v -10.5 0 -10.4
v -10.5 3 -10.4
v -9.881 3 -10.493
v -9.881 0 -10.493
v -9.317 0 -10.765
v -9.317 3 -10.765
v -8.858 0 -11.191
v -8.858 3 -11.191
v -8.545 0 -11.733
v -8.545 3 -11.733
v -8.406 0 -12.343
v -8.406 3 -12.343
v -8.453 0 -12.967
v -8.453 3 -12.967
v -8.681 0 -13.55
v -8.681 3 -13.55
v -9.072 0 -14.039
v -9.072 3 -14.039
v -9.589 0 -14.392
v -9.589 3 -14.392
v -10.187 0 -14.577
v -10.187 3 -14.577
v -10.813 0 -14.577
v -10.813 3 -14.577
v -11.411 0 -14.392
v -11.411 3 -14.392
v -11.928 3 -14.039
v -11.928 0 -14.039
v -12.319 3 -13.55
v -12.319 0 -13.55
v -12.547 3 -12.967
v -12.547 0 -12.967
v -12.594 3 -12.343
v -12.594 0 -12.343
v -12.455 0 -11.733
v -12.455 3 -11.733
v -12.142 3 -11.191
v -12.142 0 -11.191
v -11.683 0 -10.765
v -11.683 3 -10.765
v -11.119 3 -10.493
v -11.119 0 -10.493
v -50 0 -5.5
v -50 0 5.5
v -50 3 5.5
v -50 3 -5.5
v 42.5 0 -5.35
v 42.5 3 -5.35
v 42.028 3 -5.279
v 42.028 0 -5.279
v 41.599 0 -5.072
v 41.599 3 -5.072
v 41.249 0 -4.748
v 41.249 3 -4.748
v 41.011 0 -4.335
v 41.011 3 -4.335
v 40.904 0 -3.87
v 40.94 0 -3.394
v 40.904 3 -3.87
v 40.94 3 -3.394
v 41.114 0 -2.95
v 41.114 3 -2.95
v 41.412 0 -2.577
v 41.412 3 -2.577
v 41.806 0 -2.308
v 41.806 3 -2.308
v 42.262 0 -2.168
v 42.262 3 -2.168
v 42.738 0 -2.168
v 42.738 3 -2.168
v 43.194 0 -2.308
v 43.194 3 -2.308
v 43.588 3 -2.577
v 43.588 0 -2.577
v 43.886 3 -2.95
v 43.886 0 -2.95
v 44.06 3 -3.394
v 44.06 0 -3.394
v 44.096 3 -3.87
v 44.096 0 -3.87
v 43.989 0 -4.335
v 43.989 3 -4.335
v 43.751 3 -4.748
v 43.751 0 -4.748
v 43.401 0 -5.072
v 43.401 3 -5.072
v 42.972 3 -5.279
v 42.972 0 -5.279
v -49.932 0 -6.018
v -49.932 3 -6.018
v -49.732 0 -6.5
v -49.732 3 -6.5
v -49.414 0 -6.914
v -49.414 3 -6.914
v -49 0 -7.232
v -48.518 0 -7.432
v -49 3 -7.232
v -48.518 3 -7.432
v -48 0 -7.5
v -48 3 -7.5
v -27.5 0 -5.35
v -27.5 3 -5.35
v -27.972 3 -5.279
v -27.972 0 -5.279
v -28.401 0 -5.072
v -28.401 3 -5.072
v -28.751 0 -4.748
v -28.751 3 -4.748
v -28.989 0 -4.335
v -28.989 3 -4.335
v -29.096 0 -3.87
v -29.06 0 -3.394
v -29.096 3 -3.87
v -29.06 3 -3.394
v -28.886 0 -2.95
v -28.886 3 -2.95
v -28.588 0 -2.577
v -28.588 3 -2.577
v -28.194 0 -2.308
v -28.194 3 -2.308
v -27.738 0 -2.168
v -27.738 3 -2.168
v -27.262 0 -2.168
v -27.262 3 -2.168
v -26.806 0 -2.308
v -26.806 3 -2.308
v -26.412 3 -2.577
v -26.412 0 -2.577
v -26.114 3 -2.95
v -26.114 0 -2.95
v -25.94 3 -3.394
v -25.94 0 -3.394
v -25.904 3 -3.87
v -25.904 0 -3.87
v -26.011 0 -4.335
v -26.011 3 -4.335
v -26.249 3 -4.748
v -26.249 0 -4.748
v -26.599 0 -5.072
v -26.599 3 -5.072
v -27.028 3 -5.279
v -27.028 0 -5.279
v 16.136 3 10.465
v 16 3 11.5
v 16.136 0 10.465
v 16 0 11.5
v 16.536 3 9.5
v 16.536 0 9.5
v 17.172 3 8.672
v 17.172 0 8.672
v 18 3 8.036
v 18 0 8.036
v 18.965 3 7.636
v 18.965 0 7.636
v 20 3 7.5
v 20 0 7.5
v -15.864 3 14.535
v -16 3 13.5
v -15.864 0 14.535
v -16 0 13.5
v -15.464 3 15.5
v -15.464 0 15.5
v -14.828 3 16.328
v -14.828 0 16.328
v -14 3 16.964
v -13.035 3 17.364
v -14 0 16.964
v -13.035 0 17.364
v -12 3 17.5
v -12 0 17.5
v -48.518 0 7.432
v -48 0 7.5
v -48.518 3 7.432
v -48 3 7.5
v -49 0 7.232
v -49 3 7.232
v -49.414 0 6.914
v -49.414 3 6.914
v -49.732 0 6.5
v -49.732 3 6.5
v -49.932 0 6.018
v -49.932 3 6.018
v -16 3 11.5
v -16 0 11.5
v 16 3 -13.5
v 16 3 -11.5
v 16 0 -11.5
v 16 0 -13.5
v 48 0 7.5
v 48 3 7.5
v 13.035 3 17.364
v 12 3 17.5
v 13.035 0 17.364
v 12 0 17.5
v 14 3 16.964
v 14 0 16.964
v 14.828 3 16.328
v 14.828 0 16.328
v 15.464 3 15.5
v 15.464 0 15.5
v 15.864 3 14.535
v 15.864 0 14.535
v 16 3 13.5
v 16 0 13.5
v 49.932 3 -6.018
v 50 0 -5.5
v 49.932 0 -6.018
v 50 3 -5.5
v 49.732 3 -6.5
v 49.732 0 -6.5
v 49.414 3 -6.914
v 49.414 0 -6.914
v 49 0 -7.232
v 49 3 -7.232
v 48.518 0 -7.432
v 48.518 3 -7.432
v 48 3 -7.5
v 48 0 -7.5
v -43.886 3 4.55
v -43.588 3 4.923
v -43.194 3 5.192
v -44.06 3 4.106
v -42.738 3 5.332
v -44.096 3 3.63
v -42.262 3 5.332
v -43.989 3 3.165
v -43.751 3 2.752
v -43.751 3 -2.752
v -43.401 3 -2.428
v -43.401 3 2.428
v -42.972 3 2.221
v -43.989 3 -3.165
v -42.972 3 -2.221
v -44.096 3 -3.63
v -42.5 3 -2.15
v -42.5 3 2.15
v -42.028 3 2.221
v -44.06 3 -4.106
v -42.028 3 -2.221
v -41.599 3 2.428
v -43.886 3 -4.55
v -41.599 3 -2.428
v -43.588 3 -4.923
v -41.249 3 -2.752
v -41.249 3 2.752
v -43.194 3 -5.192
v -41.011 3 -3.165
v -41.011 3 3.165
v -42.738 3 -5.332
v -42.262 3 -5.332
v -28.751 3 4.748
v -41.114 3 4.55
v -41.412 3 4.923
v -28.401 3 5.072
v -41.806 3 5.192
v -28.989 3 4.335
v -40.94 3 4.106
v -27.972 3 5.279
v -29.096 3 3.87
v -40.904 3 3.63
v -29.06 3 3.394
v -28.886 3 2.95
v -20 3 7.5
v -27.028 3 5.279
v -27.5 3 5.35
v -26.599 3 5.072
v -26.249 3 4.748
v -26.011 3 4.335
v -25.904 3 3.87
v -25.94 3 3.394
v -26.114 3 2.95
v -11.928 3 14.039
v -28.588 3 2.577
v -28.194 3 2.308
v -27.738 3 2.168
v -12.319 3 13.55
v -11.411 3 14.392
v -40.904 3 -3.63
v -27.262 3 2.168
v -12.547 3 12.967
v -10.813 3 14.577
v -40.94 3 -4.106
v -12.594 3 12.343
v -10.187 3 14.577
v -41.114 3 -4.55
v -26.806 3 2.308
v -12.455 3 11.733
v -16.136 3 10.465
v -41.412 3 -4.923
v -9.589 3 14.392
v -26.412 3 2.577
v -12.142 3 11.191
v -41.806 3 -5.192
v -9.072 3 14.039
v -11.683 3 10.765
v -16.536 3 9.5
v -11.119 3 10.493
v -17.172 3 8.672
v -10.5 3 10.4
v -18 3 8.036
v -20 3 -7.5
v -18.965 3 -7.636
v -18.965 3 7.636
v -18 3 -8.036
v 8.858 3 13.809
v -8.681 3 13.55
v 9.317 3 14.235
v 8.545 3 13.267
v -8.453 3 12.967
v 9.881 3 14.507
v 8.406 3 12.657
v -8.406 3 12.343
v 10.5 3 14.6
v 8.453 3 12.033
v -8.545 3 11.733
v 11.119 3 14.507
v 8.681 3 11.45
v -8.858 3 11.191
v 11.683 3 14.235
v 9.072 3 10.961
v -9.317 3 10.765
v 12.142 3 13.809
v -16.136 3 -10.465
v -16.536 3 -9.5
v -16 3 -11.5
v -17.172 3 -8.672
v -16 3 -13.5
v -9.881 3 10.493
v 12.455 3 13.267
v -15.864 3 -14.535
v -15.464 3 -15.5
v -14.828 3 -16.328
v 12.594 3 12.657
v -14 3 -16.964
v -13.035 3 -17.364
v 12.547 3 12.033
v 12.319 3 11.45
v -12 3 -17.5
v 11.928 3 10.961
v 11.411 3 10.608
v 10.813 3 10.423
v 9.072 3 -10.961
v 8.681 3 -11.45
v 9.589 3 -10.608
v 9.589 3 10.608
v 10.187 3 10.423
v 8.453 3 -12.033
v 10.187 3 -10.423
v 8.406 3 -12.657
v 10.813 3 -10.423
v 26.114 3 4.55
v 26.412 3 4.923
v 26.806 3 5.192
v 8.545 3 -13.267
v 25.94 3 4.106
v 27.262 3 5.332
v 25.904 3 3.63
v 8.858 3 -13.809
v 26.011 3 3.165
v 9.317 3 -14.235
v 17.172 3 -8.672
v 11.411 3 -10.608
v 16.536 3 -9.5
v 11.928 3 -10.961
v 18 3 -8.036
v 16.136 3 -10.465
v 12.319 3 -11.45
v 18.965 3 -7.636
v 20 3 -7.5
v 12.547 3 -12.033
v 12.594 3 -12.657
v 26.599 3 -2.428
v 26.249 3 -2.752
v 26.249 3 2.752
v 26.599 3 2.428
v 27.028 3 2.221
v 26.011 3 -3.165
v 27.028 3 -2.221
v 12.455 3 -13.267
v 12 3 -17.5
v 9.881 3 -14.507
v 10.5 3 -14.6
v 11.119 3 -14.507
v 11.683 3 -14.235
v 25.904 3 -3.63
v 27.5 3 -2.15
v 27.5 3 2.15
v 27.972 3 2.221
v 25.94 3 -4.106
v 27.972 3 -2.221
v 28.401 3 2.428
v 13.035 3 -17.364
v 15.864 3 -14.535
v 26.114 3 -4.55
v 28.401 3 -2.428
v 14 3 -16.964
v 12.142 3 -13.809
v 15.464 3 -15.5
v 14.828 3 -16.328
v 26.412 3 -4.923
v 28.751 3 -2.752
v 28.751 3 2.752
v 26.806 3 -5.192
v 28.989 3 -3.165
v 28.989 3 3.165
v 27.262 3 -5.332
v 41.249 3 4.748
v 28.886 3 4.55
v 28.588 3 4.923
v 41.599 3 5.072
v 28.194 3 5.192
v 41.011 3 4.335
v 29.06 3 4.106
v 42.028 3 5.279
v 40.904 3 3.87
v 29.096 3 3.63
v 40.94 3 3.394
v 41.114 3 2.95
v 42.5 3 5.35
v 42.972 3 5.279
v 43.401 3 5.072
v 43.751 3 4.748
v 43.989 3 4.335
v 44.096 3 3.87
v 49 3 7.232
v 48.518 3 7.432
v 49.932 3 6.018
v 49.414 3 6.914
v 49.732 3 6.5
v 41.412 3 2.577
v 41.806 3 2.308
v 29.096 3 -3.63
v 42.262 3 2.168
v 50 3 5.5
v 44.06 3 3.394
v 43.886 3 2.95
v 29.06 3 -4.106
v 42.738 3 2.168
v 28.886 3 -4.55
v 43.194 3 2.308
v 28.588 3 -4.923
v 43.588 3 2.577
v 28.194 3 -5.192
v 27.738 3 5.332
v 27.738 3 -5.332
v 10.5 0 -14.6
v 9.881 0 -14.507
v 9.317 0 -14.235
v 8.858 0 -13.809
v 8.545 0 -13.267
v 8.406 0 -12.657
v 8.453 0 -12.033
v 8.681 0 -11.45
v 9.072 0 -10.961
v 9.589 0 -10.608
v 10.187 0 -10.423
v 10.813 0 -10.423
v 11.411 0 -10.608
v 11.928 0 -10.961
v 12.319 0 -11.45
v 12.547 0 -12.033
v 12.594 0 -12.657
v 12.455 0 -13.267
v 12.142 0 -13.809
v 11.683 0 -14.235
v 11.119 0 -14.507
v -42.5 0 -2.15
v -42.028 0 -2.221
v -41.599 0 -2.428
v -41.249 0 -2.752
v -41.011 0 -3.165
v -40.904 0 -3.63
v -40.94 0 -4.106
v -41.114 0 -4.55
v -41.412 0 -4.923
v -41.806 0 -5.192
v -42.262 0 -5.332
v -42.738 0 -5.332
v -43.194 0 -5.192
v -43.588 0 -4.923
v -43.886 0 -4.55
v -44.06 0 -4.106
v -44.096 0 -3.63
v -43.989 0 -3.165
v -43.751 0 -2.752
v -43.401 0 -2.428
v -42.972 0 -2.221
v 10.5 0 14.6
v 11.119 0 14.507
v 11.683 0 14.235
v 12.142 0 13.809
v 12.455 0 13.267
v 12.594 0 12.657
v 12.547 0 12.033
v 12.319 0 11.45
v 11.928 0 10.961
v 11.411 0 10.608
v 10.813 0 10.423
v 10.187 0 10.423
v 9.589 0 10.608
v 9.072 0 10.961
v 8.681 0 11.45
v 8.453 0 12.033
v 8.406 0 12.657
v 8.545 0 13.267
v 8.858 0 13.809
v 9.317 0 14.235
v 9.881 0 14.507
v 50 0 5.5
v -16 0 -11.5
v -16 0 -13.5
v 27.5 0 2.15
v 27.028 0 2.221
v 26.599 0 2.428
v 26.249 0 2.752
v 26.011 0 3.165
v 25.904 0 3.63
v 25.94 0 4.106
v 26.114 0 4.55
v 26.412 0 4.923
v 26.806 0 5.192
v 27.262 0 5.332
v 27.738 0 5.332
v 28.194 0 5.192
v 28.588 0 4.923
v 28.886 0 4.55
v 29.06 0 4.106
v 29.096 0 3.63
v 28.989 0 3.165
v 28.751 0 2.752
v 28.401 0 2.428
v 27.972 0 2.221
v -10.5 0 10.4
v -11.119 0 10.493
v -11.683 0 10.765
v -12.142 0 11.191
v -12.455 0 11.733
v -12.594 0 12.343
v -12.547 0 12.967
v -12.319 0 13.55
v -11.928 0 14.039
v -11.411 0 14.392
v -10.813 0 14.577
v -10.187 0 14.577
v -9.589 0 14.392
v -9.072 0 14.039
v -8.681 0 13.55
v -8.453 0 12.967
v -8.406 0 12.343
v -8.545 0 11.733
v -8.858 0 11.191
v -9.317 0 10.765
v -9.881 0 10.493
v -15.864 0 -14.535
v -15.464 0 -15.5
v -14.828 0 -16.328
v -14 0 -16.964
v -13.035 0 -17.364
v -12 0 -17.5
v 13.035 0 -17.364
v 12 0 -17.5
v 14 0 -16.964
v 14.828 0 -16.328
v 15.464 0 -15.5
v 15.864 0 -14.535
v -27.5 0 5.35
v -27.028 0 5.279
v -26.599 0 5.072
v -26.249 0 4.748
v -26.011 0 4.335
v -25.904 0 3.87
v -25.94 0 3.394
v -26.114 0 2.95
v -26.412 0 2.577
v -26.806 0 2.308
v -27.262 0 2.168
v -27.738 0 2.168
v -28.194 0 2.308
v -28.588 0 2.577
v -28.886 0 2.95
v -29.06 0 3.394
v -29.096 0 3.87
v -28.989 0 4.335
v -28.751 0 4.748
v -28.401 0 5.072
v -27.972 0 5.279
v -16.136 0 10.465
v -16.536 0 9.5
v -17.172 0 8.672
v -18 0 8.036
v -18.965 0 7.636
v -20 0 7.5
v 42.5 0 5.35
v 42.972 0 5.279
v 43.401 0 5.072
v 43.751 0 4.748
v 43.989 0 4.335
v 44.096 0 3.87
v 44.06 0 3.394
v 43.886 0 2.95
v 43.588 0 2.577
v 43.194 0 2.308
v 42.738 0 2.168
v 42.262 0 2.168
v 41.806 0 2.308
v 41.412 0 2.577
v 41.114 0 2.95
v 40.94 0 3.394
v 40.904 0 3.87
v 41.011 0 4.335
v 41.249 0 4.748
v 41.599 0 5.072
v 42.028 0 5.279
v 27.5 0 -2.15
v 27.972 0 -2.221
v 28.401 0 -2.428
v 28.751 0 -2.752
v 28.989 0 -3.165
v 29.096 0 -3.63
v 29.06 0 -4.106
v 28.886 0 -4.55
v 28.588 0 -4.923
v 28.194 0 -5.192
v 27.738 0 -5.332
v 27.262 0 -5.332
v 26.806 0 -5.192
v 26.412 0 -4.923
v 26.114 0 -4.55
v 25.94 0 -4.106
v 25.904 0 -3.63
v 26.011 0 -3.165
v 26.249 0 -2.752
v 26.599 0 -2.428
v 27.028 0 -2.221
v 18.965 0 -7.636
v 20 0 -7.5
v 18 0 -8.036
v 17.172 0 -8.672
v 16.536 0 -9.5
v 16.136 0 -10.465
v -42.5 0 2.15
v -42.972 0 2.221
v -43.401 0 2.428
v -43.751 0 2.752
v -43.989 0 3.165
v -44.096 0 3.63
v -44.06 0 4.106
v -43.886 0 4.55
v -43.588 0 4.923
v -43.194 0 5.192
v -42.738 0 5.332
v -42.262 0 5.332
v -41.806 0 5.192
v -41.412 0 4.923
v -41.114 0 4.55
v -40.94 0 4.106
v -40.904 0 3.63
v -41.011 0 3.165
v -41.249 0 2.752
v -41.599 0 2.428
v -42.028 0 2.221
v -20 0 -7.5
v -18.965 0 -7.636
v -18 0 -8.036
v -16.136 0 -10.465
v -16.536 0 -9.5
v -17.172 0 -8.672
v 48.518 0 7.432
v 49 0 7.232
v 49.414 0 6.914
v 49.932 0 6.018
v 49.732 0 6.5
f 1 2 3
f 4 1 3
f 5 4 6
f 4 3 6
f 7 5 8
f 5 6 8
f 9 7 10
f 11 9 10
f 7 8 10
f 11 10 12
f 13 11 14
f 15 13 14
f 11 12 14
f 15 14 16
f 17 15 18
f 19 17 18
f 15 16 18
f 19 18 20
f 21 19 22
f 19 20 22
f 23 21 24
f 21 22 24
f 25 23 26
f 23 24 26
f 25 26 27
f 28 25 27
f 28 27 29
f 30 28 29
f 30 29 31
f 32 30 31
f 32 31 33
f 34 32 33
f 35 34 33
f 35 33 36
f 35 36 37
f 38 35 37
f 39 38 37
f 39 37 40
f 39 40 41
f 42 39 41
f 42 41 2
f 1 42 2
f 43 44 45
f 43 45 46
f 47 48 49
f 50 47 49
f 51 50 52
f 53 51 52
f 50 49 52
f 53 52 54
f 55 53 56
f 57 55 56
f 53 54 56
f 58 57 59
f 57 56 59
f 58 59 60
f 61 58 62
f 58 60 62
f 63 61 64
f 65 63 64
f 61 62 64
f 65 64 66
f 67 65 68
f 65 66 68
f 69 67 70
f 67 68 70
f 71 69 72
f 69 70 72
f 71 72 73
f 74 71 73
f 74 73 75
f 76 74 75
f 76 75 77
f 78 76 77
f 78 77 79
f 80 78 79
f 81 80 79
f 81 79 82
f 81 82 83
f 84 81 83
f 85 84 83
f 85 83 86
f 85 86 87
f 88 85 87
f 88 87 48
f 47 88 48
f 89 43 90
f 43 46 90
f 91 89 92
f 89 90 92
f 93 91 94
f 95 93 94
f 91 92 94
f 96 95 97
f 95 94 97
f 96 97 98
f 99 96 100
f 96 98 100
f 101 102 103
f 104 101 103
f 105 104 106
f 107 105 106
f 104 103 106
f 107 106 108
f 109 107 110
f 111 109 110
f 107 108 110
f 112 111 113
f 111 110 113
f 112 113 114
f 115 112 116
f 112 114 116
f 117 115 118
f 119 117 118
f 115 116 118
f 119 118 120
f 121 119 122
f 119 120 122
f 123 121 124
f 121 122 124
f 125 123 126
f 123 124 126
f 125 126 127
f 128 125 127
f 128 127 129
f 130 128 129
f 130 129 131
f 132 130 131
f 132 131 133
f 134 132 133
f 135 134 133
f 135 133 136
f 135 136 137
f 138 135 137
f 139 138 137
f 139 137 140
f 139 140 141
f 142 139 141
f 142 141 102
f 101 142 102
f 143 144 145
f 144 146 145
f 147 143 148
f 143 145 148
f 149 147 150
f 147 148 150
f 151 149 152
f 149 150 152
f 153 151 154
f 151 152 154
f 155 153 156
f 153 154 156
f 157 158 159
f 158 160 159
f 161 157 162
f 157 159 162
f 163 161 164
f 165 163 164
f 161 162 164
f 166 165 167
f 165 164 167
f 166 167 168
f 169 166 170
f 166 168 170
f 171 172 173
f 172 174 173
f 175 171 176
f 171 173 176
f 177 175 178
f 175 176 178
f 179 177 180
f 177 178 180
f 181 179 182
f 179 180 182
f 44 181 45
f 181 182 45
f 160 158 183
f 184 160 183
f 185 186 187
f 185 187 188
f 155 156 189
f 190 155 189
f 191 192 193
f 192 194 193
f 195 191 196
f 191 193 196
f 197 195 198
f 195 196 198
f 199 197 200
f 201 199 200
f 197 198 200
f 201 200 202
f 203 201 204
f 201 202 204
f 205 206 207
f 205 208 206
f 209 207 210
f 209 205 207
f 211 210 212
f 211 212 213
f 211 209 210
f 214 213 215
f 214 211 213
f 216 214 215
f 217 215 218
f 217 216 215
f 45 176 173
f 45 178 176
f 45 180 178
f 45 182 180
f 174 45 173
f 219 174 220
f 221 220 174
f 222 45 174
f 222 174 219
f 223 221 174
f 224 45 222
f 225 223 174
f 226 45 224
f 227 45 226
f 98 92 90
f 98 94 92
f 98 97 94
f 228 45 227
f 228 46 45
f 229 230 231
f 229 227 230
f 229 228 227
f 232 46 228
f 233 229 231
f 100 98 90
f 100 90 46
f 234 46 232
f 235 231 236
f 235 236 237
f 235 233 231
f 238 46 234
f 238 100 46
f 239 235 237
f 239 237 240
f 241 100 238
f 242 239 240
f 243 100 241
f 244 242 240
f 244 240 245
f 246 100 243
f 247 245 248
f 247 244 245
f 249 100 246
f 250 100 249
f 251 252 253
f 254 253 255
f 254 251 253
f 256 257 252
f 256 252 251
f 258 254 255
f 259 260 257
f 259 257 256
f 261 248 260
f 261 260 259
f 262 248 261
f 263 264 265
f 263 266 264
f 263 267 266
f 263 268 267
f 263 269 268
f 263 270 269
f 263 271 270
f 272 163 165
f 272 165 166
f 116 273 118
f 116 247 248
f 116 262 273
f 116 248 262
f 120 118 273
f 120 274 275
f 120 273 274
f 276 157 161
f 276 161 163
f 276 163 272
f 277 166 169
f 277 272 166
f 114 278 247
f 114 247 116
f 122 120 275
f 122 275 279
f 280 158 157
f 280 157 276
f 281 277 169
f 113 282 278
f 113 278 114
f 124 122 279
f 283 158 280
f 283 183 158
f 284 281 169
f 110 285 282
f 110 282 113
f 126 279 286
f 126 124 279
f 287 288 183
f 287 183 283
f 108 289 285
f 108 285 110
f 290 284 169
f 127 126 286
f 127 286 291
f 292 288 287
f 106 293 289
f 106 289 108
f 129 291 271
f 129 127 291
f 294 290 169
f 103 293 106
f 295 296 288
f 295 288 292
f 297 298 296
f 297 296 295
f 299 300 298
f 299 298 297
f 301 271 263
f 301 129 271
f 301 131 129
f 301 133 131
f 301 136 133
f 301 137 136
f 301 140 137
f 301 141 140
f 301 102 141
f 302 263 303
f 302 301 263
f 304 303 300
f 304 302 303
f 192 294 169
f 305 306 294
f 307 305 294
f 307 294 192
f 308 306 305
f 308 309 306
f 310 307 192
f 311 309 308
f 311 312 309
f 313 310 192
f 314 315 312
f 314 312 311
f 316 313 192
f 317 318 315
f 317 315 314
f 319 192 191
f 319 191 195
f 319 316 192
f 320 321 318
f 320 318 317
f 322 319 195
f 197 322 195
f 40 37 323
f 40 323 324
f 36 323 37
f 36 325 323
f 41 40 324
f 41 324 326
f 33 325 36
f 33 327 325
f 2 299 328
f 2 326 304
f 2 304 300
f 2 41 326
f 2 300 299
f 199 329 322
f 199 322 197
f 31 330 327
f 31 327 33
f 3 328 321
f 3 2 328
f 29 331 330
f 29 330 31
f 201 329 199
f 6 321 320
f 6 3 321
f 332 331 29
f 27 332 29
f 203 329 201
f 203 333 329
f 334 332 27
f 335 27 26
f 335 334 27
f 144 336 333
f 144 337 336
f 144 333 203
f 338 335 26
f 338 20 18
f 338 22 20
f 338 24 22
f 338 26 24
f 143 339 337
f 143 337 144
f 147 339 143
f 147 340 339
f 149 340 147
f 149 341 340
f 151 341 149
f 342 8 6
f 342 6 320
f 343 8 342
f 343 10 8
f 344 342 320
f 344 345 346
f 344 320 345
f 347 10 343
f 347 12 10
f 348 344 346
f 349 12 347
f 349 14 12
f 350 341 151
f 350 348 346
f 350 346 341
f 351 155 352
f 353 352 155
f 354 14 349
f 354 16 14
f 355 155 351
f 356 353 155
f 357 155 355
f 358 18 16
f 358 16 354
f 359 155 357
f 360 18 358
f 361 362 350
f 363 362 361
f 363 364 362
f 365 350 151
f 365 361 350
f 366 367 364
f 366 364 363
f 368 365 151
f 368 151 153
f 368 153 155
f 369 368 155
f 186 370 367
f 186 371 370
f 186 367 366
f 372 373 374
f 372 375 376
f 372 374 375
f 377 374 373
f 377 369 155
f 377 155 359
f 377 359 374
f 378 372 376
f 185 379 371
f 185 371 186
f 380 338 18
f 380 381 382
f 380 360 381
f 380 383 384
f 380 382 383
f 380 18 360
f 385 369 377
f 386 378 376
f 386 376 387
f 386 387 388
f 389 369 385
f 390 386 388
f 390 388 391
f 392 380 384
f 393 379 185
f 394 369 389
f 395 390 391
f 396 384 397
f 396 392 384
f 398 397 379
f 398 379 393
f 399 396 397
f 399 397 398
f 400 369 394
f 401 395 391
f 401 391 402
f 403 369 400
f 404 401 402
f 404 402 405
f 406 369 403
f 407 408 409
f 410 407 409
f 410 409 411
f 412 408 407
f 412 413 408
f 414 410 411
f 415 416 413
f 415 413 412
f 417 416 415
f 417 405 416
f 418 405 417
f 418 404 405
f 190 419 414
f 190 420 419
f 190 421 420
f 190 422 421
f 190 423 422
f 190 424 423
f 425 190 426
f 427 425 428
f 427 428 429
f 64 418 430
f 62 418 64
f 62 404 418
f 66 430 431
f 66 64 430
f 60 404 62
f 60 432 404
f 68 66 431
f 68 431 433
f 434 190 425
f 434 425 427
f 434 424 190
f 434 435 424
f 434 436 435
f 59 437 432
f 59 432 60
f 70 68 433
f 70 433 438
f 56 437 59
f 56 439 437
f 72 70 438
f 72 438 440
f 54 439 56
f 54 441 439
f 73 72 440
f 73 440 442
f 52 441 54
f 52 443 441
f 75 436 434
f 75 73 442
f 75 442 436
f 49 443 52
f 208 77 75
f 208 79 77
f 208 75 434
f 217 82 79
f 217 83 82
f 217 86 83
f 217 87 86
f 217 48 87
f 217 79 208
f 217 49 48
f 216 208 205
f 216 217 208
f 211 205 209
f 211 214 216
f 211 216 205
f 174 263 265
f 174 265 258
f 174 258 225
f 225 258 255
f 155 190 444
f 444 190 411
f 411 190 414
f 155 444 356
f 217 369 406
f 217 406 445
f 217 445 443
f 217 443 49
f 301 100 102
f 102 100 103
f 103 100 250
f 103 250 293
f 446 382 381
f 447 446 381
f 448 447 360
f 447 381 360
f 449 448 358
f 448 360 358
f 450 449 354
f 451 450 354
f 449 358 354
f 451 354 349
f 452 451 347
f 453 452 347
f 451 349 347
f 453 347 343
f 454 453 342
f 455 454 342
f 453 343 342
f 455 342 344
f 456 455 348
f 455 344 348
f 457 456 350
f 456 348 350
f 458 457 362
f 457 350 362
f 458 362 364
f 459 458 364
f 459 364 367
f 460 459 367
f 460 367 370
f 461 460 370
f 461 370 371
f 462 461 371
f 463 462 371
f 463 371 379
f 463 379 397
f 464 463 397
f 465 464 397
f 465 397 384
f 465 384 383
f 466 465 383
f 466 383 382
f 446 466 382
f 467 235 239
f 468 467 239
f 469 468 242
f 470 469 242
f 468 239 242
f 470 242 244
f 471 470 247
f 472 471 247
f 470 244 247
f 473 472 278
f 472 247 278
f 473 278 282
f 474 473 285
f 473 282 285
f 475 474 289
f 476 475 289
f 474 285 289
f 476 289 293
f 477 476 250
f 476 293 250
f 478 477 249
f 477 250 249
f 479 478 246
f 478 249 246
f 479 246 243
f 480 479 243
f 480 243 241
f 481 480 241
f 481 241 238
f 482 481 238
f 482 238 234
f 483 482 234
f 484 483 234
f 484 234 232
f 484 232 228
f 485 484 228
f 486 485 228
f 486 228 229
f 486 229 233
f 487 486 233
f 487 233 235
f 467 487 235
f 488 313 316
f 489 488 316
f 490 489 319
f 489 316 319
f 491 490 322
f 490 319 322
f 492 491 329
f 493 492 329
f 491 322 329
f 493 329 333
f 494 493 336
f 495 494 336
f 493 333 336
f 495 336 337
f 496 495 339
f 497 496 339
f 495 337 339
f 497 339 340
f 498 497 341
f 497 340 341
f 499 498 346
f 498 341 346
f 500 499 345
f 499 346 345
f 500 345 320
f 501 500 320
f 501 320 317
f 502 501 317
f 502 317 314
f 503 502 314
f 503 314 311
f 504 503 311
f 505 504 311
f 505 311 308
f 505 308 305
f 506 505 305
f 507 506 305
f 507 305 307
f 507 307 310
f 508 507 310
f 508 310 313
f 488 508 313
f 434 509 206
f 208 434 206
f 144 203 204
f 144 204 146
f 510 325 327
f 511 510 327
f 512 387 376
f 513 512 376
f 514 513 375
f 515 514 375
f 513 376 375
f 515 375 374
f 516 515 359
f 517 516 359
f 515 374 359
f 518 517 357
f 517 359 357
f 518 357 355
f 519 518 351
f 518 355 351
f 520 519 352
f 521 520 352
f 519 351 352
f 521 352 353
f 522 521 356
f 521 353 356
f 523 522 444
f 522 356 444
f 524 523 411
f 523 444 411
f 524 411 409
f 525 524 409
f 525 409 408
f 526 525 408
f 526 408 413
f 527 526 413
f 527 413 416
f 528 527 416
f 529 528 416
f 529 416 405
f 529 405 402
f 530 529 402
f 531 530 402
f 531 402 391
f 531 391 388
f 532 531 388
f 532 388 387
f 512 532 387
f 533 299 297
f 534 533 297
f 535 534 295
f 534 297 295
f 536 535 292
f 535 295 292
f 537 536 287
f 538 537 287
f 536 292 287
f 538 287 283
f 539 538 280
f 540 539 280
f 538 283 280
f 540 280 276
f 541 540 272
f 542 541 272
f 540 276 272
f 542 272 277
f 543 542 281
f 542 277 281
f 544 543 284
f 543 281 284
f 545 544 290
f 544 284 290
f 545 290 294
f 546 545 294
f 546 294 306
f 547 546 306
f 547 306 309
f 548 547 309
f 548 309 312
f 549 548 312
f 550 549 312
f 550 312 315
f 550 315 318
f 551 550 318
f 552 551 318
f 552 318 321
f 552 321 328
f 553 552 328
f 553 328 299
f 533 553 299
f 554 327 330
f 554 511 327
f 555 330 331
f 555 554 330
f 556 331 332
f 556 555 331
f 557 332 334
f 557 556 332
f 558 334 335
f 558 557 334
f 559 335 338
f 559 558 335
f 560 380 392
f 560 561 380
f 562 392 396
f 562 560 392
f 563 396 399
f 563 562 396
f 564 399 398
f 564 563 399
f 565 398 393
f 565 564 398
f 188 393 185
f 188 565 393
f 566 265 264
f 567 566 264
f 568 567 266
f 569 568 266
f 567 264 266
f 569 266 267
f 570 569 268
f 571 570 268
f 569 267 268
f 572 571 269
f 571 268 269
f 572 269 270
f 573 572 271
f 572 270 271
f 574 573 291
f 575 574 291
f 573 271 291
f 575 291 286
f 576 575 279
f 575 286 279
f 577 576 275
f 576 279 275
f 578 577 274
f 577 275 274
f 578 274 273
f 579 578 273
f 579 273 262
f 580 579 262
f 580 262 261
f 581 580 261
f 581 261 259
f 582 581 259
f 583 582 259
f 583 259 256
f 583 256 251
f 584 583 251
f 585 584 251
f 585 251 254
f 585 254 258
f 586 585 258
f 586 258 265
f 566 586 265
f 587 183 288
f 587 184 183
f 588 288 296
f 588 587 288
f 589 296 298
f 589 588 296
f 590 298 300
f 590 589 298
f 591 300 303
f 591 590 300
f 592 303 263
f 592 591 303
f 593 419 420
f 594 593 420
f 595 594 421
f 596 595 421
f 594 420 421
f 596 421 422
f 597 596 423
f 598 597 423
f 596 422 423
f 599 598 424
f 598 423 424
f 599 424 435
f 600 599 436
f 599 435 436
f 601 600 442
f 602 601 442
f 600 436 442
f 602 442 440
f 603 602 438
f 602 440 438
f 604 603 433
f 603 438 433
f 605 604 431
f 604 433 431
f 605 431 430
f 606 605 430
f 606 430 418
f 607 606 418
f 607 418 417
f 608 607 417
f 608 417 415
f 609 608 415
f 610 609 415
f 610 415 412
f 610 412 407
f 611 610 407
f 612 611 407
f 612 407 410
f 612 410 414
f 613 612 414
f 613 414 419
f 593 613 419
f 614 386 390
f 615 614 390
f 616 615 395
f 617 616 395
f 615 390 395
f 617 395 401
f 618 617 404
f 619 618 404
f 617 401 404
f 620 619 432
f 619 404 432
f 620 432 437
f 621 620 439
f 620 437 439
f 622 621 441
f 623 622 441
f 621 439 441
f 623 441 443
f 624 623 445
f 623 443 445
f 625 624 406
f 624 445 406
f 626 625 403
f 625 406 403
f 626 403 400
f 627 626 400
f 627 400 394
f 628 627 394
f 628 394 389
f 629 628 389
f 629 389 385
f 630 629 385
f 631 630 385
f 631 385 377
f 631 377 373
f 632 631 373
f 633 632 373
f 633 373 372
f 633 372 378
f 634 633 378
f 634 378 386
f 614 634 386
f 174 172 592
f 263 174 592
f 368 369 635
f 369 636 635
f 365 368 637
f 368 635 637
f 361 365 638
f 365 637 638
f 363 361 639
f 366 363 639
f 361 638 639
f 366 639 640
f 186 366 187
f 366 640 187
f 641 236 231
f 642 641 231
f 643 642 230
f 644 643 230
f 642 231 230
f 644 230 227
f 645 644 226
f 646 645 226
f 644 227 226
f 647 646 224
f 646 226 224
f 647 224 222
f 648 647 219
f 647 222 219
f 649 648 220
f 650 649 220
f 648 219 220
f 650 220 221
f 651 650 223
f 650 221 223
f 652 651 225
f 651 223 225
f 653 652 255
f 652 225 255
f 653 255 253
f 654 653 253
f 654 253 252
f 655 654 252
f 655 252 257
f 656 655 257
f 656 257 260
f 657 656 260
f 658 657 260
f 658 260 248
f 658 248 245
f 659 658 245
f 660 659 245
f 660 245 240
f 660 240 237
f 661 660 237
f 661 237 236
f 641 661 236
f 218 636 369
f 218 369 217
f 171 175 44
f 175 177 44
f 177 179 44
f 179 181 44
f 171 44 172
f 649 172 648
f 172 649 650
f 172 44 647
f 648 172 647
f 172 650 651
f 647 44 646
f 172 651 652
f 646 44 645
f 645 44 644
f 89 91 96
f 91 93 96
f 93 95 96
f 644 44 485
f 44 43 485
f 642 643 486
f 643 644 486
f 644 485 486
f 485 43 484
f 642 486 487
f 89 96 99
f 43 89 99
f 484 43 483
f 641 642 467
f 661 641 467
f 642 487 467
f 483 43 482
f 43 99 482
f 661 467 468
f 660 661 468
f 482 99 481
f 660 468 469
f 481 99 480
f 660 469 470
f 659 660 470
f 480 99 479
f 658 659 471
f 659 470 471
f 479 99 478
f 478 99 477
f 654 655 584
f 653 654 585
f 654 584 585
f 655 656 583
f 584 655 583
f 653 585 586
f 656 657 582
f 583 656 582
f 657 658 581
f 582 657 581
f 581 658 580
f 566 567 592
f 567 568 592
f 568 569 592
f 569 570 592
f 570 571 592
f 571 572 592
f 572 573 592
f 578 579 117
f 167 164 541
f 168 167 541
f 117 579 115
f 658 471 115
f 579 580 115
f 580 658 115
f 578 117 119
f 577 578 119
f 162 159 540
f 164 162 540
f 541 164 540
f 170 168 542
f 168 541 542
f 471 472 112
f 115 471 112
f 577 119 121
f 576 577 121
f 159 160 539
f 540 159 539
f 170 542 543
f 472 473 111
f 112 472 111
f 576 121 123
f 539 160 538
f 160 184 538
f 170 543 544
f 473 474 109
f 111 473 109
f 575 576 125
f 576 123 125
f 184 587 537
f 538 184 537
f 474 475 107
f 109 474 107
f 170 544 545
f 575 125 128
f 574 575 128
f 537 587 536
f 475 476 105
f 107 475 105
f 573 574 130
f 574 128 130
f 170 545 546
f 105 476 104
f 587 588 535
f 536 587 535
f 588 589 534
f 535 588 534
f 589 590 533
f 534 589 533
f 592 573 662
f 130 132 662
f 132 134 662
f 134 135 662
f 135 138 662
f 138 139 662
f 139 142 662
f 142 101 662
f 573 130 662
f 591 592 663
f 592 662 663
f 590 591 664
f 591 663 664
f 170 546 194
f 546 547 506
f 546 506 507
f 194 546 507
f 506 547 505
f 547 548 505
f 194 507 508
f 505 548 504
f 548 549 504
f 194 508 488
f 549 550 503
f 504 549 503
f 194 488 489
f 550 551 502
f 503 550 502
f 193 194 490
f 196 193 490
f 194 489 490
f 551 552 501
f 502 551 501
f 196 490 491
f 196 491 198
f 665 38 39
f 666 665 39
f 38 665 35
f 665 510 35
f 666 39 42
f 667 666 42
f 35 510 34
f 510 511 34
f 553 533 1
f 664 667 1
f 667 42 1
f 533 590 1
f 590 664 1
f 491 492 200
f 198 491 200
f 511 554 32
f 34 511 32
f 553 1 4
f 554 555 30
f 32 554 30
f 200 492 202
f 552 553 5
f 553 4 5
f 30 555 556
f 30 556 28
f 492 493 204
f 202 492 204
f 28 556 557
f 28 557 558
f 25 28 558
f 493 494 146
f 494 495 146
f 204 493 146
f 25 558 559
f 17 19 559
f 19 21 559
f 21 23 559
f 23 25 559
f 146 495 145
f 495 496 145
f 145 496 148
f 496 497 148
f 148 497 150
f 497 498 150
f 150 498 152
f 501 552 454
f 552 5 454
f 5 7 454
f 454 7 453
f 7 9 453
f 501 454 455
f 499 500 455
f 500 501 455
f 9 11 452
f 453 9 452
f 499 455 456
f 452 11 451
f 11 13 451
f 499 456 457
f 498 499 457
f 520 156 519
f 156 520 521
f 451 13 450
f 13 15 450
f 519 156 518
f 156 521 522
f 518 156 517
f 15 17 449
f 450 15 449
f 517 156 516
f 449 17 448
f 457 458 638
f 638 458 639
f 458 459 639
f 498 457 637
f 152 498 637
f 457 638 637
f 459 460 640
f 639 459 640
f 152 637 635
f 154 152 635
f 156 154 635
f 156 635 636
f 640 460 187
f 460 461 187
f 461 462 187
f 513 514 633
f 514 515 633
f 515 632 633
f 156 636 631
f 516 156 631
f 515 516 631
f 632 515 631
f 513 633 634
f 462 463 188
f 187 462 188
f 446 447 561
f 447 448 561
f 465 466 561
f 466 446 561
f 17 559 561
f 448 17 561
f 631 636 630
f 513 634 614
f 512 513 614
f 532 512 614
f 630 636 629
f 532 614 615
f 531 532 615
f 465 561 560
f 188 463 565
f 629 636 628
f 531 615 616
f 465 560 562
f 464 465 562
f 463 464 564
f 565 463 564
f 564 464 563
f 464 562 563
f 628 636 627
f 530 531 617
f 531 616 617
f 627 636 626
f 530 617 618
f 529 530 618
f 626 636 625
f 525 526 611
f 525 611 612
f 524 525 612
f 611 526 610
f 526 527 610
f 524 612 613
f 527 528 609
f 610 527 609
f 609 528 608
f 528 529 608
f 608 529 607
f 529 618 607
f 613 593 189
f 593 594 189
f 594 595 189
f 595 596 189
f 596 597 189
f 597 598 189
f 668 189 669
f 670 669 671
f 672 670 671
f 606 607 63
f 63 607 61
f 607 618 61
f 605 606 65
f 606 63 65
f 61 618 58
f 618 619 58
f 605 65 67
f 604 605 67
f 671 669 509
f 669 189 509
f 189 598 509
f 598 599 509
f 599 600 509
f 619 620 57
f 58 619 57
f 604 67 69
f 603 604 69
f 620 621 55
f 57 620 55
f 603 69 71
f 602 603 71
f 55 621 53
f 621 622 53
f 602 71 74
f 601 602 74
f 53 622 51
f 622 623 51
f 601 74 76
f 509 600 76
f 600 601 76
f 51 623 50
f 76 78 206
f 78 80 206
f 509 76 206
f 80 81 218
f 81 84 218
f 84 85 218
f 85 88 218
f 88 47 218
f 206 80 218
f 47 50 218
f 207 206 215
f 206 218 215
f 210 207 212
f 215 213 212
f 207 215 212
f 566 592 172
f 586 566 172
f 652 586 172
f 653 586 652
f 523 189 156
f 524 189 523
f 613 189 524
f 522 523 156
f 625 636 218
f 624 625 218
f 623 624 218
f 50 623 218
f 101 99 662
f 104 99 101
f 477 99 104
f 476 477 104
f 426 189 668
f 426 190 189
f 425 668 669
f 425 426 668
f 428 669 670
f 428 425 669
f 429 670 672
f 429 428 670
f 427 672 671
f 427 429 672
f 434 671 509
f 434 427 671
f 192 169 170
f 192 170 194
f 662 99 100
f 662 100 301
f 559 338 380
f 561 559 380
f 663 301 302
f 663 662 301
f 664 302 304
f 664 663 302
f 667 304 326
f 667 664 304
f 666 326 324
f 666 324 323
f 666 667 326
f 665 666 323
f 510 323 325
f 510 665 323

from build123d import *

# Parameters (mm, degrees)
SKETCH_1_W          = 100
SKETCH_1_H          = 15
EXTRUDE_1_DEPTH     = 3
SKETCH_2_W          = 32
SKETCH_2_H          = 35
EXTRUDE_2_DEPTH     = 3
SKETCH_3_R          = 1.6
CUT_EXTRUDE_1_DEPTH = 54.058929503
SKETCH_4_R          = 2.1
CUT_EXTRUDE_2_DEPTH = 54.058929503
FILLET_1_R          = 4
FILLET_2_R          = 2


with BuildPart() as part:
    # 草图1 → 凸台-拉伸1 (new body)
    with BuildSketch(Plane(origin=(0, 0, 0), x_dir=(1, 0, 0), z_dir=(0, 1, 0))):
        Rectangle(SKETCH_1_W, SKETCH_1_H)
    extrude(amount=EXTRUDE_1_DEPTH)

    # 草图2 → 凸台-拉伸2 (add)
    with BuildSketch(Plane(origin=(0, 3, 0), x_dir=(1, 0, 0), z_dir=(0, 1, 0))):
        Rectangle(SKETCH_2_W, SKETCH_2_H)
    extrude(amount=-EXTRUDE_2_DEPTH)

    # 草图3 → 切除-拉伸1 (cut, through all)
    with BuildSketch(Plane(origin=(0, 3, 0), x_dir=(1, 0, 0), z_dir=(0, 1, 0))):
        with Locations(Location((-42.5, 3.75, 0), (0, 0, 270))):
            Circle(SKETCH_3_R)
        with Locations(Location((-42.5, -3.75, 0), (0, 0, 90))):
            Circle(SKETCH_3_R)
        with Locations(Location((-27.5, -3.75, 0), (0, 0, 270))):
            Circle(SKETCH_3_R)
        with Locations(Location((-27.5, 3.75, 0), (0, 0, 90))):
            Circle(SKETCH_3_R)
        with Locations(Location((42.5, -3.75, 0), (0, 0, 270))):
            Circle(SKETCH_3_R)
        with Locations(Location((42.5, 3.75, 0), (0, 0, 90))):
            Circle(SKETCH_3_R)
        with Locations(Location((27.5, -3.75, 0), (0, 0, 90))):
            Circle(SKETCH_3_R)
        with Locations(Location((27.5, 3.75, 0), (0, 0, 270))):
            Circle(SKETCH_3_R)
    extrude(amount=-CUT_EXTRUDE_1_DEPTH, mode=Mode.SUBTRACT)

    # 草图4 → 切除-拉伸2 (cut, through all)
    with BuildSketch(Plane(origin=(0, 3, 0), x_dir=(1, 0, 0), z_dir=(0, 1, 0))):
        with Locations(Location((-10.5, 12.5, 0), (0, 0, 270))):
            Circle(SKETCH_4_R)
        with Locations(Location((-10.5, -12.5, 0), (0, 0, 90))):
            Circle(SKETCH_4_R)
        with Locations(Location((10.5, -12.5, 0), (0, 0, 270))):
            Circle(SKETCH_4_R)
        with Locations(Location((10.5, 12.5, 0), (0, 0, 90))):
            Circle(SKETCH_4_R)
    extrude(amount=-CUT_EXTRUDE_2_DEPTH, mode=Mode.SUBTRACT)

    # 圆角1
    fillet_1_edges = [part.edges().sort_by_distance(p)[0] for p in [
        (-16, 1.5, 17.5),
        (16, 1.5, -17.5),
        (-16, 1.5, -7.5),
        (-16, 1.5, 7.5),
        (-16, 1.5, -17.5),
        (16, 1.5, -7.5),
        (16, 1.5, 7.5),
        (16, 1.5, 17.5),
    ]]
    fillet(fillet_1_edges, radius=FILLET_1_R)

    # 圆角2
    fillet_2_edges = [part.edges().sort_by_distance(p)[0] for p in [
        (50, 1.5, 7.5),
        (-50, 1.5, 7.5),
        (-50, 1.5, -7.5),
        (50, 1.5, -7.5),
    ]]
    fillet(fillet_2_edges, radius=FILLET_2_R)


solid = part.part
